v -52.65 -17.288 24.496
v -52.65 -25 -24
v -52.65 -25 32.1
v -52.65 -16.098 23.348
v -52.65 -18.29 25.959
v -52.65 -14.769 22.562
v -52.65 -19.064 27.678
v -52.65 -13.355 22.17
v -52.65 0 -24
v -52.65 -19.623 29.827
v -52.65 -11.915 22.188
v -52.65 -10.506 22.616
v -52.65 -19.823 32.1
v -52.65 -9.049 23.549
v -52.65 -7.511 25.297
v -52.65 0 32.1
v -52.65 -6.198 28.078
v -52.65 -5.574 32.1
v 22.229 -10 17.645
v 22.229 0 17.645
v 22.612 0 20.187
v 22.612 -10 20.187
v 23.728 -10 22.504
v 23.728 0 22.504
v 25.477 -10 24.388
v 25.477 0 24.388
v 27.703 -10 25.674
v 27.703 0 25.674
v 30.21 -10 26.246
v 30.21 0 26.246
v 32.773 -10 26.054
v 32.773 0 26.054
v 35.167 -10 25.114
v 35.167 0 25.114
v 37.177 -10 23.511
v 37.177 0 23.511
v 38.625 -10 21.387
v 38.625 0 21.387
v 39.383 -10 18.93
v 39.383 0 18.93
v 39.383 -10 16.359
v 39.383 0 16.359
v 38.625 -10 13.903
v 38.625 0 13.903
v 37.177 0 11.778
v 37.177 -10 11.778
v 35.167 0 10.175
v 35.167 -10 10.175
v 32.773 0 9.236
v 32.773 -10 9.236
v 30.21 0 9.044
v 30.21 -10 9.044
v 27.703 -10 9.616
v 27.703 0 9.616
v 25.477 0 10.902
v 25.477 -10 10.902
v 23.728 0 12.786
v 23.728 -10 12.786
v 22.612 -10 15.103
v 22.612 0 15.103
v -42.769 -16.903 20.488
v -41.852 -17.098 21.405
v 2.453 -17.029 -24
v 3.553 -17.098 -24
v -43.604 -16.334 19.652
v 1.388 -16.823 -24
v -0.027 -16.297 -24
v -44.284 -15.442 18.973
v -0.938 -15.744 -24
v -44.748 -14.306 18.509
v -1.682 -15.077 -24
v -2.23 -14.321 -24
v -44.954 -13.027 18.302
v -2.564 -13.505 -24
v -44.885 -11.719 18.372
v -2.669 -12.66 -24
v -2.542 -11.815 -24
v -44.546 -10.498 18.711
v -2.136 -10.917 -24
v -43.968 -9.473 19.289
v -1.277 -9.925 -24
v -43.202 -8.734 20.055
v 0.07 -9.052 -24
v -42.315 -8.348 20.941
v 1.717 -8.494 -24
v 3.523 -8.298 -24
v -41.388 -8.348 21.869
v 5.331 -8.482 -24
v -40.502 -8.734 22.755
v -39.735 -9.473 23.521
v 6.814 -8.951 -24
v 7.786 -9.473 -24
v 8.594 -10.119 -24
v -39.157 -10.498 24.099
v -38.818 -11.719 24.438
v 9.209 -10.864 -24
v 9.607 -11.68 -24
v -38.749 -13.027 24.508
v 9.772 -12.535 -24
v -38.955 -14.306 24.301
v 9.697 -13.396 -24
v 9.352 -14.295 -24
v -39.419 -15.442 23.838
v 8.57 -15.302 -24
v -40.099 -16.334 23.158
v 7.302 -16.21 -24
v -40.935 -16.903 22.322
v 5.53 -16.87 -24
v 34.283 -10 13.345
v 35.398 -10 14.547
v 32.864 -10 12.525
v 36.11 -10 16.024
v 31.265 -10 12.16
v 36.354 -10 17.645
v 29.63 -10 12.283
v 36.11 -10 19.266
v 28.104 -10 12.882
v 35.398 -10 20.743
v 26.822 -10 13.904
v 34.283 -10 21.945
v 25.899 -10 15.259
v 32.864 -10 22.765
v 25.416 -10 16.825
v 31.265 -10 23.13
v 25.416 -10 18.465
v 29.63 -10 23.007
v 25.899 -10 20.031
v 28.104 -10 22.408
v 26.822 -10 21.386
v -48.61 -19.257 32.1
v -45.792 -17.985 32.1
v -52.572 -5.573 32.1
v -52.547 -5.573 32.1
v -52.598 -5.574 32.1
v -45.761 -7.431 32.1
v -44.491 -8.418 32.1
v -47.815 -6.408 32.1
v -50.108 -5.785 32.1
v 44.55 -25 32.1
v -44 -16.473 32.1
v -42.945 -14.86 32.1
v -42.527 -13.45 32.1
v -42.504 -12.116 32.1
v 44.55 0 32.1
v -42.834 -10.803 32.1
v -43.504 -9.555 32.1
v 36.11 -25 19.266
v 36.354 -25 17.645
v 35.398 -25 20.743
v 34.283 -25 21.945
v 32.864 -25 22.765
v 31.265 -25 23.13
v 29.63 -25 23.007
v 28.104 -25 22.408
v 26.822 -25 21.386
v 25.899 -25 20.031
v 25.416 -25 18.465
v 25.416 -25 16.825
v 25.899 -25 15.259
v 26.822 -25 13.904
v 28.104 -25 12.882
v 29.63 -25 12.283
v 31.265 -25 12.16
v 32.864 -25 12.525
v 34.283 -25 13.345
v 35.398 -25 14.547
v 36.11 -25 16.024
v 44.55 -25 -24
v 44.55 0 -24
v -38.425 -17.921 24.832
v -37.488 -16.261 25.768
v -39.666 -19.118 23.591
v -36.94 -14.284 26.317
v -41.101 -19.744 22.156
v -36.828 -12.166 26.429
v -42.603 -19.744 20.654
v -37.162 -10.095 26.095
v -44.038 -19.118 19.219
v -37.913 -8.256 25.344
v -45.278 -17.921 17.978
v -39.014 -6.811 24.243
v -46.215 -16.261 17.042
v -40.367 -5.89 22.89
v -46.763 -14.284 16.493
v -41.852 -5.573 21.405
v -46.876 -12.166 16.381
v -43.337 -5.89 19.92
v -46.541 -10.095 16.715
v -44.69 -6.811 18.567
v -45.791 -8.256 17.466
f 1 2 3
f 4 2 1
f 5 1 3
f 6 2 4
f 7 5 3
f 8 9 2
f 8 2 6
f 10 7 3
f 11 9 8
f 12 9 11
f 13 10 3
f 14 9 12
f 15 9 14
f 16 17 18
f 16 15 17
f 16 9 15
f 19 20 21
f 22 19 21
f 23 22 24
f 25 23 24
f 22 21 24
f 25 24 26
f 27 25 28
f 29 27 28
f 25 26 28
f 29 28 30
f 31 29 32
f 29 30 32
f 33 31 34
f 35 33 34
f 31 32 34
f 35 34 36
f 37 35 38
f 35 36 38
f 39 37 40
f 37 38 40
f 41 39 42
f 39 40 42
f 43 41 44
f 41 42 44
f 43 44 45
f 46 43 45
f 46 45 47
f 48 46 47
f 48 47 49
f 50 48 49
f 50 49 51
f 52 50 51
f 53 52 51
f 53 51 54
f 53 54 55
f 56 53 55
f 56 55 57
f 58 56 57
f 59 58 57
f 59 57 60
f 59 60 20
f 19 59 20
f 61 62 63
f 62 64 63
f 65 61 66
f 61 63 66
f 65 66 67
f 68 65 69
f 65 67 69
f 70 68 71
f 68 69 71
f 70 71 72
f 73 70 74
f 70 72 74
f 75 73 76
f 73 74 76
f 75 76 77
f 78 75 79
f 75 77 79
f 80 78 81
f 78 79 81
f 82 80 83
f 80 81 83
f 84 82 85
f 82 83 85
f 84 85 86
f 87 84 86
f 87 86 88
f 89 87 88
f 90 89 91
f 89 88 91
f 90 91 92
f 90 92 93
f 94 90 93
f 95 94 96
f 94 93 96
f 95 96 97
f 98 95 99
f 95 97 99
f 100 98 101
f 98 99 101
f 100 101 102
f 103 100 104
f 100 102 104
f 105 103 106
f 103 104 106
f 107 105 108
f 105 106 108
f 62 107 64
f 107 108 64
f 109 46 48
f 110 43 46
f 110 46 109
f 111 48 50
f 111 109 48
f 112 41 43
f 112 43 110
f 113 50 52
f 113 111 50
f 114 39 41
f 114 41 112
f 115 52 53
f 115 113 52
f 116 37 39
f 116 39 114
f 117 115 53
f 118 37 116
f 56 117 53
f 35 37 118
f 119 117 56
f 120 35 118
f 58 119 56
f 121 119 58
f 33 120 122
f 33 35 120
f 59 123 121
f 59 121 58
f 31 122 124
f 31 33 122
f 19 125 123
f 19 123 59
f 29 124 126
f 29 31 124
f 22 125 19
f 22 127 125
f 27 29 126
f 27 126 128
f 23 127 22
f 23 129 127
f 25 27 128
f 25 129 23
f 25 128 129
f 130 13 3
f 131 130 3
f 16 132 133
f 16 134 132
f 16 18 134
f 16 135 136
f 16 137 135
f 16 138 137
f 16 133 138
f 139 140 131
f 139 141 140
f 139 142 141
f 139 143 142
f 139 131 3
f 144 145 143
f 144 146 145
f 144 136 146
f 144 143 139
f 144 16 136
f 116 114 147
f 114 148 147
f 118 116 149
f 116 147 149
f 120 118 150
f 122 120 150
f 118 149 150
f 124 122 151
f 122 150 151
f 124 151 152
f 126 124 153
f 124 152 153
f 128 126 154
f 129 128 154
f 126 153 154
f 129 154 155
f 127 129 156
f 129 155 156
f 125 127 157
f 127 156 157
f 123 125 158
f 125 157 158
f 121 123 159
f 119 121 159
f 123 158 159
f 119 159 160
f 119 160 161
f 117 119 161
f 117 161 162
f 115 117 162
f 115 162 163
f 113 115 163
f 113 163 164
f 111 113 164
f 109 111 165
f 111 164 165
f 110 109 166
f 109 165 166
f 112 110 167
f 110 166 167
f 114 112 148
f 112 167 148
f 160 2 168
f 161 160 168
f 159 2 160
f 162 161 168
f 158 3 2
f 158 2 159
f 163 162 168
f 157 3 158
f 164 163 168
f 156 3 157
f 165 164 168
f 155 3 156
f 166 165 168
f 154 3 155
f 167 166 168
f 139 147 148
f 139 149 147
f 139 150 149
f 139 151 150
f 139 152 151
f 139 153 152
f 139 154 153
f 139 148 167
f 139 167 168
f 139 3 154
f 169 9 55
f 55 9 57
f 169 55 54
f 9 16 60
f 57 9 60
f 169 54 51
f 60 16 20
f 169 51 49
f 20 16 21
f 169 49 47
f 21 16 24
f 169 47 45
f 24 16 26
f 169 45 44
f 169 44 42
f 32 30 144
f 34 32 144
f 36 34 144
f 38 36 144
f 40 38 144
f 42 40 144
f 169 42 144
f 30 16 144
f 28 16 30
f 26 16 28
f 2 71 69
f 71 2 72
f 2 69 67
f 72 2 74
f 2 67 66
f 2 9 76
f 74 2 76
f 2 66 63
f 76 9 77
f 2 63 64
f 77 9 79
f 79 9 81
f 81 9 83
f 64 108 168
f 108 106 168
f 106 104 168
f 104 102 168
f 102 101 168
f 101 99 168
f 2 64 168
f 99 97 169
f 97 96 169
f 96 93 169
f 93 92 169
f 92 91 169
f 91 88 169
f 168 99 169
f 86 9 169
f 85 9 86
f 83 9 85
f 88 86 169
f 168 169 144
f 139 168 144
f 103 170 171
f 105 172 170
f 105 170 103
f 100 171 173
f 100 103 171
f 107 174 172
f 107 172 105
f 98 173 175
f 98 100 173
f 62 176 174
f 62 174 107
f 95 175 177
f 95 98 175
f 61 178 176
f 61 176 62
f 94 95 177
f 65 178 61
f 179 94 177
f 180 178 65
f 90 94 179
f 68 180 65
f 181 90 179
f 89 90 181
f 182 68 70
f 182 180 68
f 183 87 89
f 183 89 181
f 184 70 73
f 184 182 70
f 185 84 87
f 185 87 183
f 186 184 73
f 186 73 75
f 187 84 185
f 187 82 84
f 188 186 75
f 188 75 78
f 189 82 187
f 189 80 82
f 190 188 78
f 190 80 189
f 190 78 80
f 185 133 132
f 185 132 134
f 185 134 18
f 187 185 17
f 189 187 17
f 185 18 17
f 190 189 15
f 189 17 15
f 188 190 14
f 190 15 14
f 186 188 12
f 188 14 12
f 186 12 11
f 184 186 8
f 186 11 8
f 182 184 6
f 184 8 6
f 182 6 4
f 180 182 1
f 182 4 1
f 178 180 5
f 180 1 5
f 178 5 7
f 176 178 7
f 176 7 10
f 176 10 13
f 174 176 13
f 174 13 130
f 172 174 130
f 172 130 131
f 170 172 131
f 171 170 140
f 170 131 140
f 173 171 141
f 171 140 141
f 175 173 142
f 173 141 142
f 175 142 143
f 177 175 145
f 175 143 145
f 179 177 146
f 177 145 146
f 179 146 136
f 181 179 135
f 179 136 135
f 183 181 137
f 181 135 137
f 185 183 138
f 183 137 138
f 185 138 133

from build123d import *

# Parameters (mm, degrees)
F0_W           = 97.2000025213
F0_H           = 56.100005284
F1_DEPTH       = 25
F5_D           = 11
F5_CBORE_D     = 17.25
F5_CBORE_DEPTH = 10
F6_D           = 8.8
F6_START       = 7.1981119
F6_CBORE_D     = 14.25
F6_CBORE_DEPTH = 8


with BuildPart() as f1:
    # F0 (on Front) → F1 (new body)
    with BuildSketch(Plane.XZ):
        with Locations((-4.0499996394, 4.0500005707)):
            Rectangle(F0_W, F0_H)
    extrude(amount=F1_DEPTH)

    # F5 (through all)
    with Locations(Plane(origin=(0, 0, 0), x_dir=(-1, 0, 0), z_dir=(0, 1, 0))):
        with Locations((-30.8541376144, 17.6449194551)):
            CounterBoreHole(F5_D / 2, F5_CBORE_D / 2, F5_CBORE_DEPTH)

    # F6 (through all)
    # its depths count from where the whole tool has entered the part; down to there all is cleared
    with Locations(Plane(origin=(-42.3750020564, 0, 42.3750020564), x_dir=(0, 1, 0), z_dir=(-0.7071067812, 0, 0.7071067812)).offset(-F6_START)):
        with Locations((-12.6984147355, 14.4579308107)):
            CounterBoreHole(F6_D / 2, F6_CBORE_D / 2, F6_CBORE_DEPTH)


solid = f1.part
